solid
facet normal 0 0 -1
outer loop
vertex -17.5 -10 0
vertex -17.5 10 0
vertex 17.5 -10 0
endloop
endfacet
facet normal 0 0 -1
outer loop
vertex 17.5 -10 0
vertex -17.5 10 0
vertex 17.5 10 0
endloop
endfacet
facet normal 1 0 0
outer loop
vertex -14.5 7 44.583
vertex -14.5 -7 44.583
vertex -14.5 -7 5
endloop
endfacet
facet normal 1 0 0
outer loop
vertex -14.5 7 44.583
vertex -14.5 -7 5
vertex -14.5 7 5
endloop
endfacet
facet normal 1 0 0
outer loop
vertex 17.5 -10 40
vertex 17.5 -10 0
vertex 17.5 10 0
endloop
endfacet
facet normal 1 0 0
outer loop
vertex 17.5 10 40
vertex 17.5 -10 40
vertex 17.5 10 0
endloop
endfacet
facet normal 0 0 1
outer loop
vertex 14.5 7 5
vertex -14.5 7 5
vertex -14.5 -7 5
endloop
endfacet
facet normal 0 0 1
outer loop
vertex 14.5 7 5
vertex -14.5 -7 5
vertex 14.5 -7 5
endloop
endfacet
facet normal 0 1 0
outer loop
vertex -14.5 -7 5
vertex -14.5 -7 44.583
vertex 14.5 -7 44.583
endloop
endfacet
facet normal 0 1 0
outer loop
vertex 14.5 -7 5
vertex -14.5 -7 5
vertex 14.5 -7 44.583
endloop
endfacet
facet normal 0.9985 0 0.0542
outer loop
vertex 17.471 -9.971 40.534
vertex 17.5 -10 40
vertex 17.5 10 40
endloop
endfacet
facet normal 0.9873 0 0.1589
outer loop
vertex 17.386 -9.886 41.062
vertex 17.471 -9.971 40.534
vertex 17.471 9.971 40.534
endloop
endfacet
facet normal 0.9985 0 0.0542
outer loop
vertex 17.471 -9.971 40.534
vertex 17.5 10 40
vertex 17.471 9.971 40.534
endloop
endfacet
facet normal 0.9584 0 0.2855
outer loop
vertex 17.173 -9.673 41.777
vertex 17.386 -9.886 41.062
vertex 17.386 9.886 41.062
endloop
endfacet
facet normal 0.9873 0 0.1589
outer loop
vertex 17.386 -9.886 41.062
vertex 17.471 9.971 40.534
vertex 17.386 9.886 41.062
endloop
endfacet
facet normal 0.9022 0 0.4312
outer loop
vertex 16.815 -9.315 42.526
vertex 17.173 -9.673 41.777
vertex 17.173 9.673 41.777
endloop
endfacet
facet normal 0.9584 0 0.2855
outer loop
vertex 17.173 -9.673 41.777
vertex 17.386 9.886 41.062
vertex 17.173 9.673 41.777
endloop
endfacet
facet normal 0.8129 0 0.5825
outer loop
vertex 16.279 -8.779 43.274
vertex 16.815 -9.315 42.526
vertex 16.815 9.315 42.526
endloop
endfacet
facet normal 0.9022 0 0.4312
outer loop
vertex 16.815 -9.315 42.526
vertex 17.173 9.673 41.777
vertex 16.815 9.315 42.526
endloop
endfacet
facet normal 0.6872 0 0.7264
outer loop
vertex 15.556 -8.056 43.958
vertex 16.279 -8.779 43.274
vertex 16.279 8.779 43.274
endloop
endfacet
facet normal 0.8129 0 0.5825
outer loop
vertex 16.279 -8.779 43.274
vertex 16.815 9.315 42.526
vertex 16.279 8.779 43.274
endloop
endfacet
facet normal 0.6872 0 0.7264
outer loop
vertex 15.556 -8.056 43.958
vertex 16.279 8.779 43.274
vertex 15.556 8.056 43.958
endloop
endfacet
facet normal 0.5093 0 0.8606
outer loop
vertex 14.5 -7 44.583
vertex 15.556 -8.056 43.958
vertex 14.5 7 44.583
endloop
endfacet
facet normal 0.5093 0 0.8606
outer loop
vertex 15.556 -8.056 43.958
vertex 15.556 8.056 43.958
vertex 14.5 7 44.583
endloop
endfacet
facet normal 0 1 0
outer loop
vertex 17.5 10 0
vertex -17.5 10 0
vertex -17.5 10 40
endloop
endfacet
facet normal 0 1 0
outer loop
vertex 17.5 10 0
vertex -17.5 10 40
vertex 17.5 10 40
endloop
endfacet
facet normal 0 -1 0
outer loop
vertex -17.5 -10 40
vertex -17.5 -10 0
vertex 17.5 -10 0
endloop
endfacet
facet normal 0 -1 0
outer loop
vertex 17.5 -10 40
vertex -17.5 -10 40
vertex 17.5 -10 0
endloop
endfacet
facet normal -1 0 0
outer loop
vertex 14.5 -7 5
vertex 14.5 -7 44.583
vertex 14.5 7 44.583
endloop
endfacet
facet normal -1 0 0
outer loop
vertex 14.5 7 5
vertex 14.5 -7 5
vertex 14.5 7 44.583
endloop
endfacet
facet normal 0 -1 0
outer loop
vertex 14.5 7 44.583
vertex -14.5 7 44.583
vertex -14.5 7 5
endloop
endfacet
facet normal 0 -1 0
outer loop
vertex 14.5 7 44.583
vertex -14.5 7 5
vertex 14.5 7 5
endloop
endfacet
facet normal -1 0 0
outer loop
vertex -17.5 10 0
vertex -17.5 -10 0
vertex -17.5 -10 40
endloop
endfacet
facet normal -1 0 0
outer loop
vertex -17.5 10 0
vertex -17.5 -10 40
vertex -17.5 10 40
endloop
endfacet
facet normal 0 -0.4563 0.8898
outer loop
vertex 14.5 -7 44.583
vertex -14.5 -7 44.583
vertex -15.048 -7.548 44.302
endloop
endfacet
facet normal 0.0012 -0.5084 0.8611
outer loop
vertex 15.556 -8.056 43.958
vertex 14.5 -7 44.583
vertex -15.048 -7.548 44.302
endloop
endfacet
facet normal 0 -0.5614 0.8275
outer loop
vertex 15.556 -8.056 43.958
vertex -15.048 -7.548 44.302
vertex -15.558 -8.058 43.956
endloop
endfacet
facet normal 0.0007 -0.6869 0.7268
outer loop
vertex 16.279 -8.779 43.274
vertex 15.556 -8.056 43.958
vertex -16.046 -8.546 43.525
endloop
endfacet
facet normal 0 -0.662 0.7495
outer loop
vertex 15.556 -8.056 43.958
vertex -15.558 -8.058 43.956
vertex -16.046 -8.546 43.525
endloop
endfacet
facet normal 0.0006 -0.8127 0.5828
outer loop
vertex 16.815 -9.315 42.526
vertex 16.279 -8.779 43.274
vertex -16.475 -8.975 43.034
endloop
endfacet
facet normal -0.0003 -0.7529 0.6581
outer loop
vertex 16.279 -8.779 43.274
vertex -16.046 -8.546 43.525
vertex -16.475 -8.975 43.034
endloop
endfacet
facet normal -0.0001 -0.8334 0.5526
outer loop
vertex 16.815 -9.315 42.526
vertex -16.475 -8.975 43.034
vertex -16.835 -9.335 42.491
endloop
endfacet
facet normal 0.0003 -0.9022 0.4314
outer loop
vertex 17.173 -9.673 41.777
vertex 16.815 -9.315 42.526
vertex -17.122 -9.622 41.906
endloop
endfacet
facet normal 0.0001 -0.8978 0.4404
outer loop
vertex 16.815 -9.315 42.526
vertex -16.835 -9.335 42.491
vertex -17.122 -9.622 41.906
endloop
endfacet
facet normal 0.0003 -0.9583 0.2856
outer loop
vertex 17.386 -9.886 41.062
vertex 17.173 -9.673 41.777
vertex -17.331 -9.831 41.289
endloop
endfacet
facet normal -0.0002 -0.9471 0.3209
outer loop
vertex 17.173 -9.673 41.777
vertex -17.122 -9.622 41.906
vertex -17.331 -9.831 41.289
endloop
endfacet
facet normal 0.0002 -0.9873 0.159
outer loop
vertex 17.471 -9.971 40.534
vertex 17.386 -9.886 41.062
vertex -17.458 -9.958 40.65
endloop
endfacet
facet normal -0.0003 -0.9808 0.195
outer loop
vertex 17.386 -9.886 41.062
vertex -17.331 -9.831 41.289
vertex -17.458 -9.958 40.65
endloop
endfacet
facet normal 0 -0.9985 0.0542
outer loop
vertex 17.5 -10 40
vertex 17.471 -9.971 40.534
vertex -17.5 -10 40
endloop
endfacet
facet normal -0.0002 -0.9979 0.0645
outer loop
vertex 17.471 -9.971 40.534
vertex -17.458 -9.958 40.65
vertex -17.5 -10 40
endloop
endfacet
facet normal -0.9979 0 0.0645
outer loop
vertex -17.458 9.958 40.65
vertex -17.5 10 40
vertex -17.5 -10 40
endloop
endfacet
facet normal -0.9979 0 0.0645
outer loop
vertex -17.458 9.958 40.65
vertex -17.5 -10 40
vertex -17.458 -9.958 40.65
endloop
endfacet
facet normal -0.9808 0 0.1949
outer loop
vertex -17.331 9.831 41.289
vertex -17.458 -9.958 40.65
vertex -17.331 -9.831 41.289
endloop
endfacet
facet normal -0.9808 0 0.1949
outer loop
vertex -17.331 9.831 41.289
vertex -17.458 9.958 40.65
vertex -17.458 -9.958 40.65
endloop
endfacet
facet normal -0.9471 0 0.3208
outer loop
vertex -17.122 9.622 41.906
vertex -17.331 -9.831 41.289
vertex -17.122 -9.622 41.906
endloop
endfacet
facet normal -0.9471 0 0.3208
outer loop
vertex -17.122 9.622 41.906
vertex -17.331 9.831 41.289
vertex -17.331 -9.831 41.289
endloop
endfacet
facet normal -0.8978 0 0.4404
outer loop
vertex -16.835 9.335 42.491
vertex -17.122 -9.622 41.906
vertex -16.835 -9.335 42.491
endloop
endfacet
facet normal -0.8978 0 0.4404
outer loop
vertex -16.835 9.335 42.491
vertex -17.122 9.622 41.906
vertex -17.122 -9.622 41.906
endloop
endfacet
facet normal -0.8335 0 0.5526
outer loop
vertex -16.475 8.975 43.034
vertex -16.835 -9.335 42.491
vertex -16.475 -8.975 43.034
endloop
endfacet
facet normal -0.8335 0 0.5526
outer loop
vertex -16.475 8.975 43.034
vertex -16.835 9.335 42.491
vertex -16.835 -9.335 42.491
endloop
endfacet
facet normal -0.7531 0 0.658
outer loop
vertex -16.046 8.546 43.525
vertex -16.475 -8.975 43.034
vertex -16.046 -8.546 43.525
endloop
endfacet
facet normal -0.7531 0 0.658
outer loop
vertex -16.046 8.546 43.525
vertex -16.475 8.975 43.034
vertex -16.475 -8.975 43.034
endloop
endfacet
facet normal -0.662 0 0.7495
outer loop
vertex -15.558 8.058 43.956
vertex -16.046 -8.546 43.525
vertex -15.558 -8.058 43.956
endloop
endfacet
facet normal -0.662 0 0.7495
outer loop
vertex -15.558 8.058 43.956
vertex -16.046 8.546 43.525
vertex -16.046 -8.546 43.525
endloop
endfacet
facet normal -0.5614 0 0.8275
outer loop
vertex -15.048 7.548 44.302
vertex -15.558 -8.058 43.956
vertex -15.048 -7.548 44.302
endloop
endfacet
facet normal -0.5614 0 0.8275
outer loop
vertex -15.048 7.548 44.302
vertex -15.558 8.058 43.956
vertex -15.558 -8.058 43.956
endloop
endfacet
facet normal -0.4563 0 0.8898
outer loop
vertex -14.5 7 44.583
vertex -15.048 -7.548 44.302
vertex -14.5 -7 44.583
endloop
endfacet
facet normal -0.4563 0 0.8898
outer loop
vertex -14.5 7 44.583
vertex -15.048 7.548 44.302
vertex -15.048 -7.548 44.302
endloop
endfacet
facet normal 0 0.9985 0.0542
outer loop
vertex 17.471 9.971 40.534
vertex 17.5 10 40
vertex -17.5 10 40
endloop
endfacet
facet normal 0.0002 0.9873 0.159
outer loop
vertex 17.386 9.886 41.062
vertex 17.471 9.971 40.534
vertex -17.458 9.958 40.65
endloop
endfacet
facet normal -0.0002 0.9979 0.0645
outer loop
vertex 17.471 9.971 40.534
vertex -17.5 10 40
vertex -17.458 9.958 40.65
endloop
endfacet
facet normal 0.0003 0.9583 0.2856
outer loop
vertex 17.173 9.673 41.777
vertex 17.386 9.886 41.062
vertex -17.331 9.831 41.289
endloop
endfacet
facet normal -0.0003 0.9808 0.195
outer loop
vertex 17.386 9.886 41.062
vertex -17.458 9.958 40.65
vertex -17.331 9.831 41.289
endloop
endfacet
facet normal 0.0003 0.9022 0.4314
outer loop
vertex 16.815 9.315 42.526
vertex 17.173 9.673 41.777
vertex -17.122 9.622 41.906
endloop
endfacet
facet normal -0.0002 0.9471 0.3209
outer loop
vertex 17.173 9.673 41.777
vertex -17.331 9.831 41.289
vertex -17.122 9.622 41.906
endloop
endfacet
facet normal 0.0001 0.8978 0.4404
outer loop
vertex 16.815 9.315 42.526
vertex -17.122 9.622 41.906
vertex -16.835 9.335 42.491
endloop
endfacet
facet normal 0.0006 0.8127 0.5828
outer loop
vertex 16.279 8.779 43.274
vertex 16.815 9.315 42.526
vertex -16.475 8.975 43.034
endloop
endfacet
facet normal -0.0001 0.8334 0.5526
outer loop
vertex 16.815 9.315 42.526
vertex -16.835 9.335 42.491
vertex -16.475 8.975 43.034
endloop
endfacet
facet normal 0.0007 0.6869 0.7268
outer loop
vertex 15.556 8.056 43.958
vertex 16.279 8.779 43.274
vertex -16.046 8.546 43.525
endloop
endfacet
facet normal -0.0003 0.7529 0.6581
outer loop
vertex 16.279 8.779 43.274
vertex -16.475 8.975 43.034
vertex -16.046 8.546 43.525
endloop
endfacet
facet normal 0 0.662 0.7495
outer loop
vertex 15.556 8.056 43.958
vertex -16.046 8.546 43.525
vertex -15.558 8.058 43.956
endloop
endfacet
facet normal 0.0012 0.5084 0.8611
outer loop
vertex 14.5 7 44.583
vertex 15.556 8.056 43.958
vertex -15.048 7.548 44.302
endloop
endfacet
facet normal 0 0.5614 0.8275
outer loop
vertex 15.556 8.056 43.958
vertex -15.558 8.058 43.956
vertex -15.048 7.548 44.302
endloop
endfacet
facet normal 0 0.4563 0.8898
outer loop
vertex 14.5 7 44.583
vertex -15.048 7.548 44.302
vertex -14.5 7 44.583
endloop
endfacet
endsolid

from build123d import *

# Parameters (mm, degrees)
F0_W        = 35
F0_H        = 20
F1_DEPTH    = 45
F2_W        = 29
F2_H        = 14
F3_DEPTH    = 40
F4_T1_DEPTH = 45
F4_T3_DEPTH = 60


# Not quite as in the source:
# - a fillet or chamfer that OpenCascade refuses, or shapes differently, is made with other operations: its cross-section is extruded or revolved along the edge and cut away or added
# - a feature names something its author has since deleted; it is built from what else it names


with BuildPart() as f1:
    # F0 (on Top) → F1 (new body)
    with BuildSketch(Plane.XY):
        Rectangle(F0_W, F0_H)
    extrude(amount=F1_DEPTH)

    # F2 (on face) → F3 (cut)
    with BuildSketch(Plane.XY.offset(45)):
        Rectangle(F2_W, F2_H)
    extrude(amount=-F3_DEPTH, mode=Mode.SUBTRACT)

    # F4: fillet of radius 5 on 4 edges, made by hand

    # F4_s2 → F4_t1 (cut)
    with BuildSketch(Plane.XZ.offset(-22.5)):
        with BuildLine():
            ThreePointArc((17.5, 40), (16.0355339059, 43.5355339059), (12.5, 45))
            Line((12.5, 45), (17.5, 45))
            Line((17.5, 45), (17.5, 40))
        make_face()
        with BuildLine():
            ThreePointArc((-17.5, 40), (-16.0355339059, 43.5355339059), (-12.5, 45))
            Line((-12.5, 45), (-17.5, 45))
            Line((-17.5, 45), (-17.5, 40))
        make_face()
    extrude(amount=F4_T1_DEPTH, mode=Mode.SUBTRACT)

    # F4_s4 → F4_t3 (cut)
    with BuildSketch(Plane.YZ.offset(-30)):
        with BuildLine():
            ThreePointArc((-5, 45), (-8.5355339059, 43.5355339059), (-10, 40))
            Line((-10, 40), (-10, 45))
            Line((-10, 45), (-5, 45))
        make_face()
        with BuildLine():
            ThreePointArc((10, 40), (8.5355339059, 43.5355339059), (5, 45))
            Line((5, 45), (10, 45))
            Line((10, 45), (10, 40))
        make_face()
    extrude(amount=F4_T3_DEPTH, mode=Mode.SUBTRACT)


solid = f1.part
